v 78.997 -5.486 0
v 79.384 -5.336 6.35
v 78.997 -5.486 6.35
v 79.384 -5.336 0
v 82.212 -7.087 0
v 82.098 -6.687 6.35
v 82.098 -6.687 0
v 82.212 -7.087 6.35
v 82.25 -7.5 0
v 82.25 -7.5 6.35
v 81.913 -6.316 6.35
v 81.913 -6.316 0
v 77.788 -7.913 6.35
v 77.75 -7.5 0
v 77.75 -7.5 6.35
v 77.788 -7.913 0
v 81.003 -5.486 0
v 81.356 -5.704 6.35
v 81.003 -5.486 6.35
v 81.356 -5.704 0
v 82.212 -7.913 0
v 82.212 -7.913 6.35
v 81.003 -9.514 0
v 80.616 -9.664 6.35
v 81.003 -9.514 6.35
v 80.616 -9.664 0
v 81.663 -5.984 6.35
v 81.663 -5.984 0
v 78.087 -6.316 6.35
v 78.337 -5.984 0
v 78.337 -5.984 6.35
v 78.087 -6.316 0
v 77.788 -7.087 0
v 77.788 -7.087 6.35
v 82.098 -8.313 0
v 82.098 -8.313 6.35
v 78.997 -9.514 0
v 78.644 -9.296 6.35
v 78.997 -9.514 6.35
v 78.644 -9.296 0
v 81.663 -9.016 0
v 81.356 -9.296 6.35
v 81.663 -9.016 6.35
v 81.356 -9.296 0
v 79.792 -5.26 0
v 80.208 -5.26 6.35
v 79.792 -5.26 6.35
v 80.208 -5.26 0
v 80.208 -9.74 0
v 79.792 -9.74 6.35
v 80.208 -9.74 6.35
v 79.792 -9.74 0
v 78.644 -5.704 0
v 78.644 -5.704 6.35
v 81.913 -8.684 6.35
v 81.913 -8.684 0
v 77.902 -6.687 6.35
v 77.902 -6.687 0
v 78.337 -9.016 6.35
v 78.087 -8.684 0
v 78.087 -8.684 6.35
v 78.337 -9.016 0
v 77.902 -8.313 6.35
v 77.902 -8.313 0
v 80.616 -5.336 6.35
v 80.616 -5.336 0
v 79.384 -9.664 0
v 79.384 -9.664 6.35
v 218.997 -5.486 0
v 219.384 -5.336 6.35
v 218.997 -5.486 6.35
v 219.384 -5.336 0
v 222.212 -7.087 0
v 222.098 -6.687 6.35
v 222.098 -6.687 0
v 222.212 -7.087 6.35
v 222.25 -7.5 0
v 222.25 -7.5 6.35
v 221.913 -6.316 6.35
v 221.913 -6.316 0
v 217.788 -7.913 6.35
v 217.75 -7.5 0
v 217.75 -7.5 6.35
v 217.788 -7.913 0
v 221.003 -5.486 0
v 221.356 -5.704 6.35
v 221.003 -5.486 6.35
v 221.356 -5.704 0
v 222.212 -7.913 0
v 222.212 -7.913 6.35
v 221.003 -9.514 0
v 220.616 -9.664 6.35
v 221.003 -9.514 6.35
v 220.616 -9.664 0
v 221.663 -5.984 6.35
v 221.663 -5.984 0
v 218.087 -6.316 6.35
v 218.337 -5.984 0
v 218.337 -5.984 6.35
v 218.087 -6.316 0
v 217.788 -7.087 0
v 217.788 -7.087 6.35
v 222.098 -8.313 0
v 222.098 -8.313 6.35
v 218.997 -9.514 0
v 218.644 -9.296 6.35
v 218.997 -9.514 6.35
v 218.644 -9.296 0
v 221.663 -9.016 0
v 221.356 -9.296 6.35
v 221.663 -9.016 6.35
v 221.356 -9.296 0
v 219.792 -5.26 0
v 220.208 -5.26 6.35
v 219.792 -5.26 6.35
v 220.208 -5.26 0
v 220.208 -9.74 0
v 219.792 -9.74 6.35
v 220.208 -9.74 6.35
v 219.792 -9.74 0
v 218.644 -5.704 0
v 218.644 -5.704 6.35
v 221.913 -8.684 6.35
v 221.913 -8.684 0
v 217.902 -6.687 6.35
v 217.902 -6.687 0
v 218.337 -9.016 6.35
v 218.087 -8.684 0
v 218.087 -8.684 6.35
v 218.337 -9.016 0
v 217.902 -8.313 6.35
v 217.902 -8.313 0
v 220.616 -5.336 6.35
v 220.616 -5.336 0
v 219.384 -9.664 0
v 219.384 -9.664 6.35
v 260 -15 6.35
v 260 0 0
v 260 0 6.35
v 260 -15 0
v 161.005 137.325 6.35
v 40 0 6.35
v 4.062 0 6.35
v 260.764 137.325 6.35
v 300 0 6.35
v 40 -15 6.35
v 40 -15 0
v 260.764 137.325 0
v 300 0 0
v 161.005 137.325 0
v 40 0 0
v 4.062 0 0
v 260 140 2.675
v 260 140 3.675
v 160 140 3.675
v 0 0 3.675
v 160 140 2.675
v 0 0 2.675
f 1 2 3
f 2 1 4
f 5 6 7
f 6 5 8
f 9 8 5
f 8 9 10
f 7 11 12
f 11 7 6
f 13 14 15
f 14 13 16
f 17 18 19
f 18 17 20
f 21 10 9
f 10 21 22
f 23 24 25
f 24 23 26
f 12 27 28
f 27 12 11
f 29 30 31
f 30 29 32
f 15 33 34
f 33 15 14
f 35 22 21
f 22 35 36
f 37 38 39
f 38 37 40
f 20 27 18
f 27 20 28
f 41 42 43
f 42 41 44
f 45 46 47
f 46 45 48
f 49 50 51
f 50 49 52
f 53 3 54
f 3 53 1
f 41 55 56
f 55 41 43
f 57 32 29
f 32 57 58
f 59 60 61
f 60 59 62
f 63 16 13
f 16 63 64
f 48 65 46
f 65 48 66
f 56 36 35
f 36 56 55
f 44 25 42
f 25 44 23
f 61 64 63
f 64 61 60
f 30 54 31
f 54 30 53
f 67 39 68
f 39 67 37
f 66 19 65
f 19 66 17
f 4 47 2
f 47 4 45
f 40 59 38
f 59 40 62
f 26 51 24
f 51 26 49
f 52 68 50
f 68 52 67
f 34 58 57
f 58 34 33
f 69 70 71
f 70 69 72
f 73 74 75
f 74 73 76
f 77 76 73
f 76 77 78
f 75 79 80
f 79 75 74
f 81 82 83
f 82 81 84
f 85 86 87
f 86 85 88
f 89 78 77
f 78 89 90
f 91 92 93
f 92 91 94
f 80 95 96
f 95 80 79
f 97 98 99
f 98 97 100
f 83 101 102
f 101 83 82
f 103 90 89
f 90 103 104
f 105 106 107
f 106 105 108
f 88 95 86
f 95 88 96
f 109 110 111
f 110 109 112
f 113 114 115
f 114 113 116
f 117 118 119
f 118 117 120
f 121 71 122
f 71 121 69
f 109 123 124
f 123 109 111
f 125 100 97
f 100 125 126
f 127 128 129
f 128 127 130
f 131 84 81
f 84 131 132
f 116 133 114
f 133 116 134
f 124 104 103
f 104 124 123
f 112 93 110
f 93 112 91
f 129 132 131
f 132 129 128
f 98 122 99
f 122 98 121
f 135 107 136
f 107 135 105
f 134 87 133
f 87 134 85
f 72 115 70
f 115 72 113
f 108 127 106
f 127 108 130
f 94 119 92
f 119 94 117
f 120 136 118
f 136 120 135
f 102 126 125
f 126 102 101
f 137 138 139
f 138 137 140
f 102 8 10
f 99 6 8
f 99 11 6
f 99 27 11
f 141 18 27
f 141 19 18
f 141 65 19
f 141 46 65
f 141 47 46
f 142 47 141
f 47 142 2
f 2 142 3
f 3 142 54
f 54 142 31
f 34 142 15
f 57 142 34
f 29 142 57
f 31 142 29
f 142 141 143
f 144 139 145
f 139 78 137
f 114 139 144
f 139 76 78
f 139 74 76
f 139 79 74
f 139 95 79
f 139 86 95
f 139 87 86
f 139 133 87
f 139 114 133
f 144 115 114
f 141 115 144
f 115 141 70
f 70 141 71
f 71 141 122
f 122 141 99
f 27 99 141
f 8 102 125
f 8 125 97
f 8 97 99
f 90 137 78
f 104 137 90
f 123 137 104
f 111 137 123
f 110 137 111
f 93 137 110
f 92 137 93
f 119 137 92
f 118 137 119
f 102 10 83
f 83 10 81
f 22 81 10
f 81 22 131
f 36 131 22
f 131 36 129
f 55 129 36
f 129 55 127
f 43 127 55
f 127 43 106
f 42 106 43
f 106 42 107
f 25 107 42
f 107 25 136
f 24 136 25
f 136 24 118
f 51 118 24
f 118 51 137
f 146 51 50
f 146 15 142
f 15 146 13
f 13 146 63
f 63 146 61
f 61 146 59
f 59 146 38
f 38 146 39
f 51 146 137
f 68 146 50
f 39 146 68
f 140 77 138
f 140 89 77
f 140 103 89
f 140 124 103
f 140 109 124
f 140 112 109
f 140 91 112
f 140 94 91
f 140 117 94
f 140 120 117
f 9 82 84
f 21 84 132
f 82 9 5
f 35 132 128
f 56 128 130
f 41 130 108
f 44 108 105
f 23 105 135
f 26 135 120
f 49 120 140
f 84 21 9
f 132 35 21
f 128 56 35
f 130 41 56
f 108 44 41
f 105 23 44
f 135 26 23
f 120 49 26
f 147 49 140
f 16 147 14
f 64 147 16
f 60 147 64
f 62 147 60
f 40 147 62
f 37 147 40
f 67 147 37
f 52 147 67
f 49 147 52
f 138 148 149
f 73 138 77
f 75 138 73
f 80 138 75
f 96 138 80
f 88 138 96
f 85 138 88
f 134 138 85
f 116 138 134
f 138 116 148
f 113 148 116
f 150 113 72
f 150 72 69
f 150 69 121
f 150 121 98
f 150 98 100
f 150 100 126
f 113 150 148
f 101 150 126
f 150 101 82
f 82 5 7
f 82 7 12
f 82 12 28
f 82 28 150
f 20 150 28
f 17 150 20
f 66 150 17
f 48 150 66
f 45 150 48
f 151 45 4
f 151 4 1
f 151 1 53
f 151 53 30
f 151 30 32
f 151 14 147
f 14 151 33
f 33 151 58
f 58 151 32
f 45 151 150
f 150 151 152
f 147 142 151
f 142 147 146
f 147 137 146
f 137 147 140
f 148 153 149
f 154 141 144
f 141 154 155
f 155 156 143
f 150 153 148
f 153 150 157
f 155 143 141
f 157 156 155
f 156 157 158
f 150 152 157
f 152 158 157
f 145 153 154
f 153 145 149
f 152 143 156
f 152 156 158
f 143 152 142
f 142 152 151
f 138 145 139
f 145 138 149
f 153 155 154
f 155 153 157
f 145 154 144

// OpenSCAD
// PART: Clipped-delta fin with through-the-wall tab, 300 root / 100 tip / 140 span, 1/4 in 6061-T6 plate
// KIND: mechanical
// MAKE: CNC mill from 6.35 mm 6061-T6 plate (waterjet the outline first if available); mill the 45 deg LE and tip bevels both faces on a vacuum plate, 2 setups (flip on the two tab holes); ream/drill tab holes 4.50 in setup 1; calipers on chords/span/tab, 45 deg angle gauge and 1.0 feeler on the bevel flat, pins in the holes
// NOTE: Fin laid flat, thickness along Z, root edge on Y=0, leading edge from the origin; tab hangs in -Y so main() spans Y -15..140
// NOTE: Root chord 300.00 mm = 11.811 in; tip chord 100.00 = 3.937 in; semi-span 140.00 = 5.512 in; LE sweep 160.00 = 6.299 in; thickness 6.35 = 1/4 in plate
// NOTE: Airframe 6.000 in OD = 152.40 mm with 2.0 mm wall (ID 148.4) and a 98 mm motor mount tube OD 101.60 = 4.000 in are ASSUMED; tab_h 15 is the brief's value and only reaches part-way to the MMT: for the tab to bottom on the MMT set tab_h = wall + (ID - MMT_OD)/2 = 2.0 + 23.4 = 25.4
// NOTE: Bevels: leading edge and tip chamfered 45 deg on BOTH faces leaving a 1.00 mm flat (1.88 mm per face); trailing edge and root stay square. A knife edge on G10 chips, keep the flat
// NOTE: Tab holes: 2 x 4.50 mm (M4 clearance, ISO 273 medium; 4.5 mm is a standard drill) at X 80 / 220, Y -7.5: injected fillet epoxy keys through them and they take 4 mm dowels in a fin-can alignment jig. Optional: set tab_hole_pitch or delete the loop
// NOTE: FLUTTER as drawn FAILS the declared 700 m/s at 3000 m: NACA TN 4197 (Martin) with G = 4.1 GPa gives Vf about 290 m/s (centroid epsilon) to 334 m/s (Martin epsilon 0.25), SF 0.41-0.48 vs sf_min 1.5. This 4.76 plate is a Mach 0.6 fin. For 700 m/s at SF 1.5 use fin_t = 12.70 (1/2 in G10, Vf about 1260 m/s, SF 1.8) or a tip-to-tip carbon layup (outside the formula)
// NOTE: G10-FR4 shear modulus 4.1 GPa is Bennett's (2025) working value (600 ksi); direct measurements report about 5.3 GPa (775 ksi). E about 18 GPa lengthwise, density 1.85 g/cm3. 6061-T6 plate (G 26 GPa) is the machined alternative: Vf about 730 m/s at 4.76 (SF 1.04), about 1120 m/s at 6.35 (SF 1.6)
// NOTE: Waterjet holds +/-0.1 on 4.76 mm G10 at quality 4-5, so the +/-0.20 on chords, span and tab is the process capability, not ISO 2768-m general (+/-0.5 over 120-400)
// SPEC-BEGIN
// {"name":"Clipped-delta G10 fin with TTW tab","size_mm":[300,155,6.35],
//  "parts":[{"name":"fin","role":"clipped-delta plate, LE and tip bevelled 45 deg both faces","size_mm":[300,140,6.35]},
//           {"name":"tab","role":"through-the-wall root tab with 2 epoxy-key holes, overlaps the fin root by 2","size_mm":[220,17,6.35]}],
//  "joints":[{"a":"tab","b":"fin","overlap_mm":2}],
//  "layout":[{"a":"tab","rel":"front","b":"fin"}],
//  "profile":[{"part":"fin","along":"y","measure":"x","from_mm":300,"to_mm":100,"why":"clipped delta: chord tapers from the root to the tip"}]}
// SPEC-END
// FLIGHT-BEGIN
// {"material":"6061-T6","process":"cnc_mill","tolerance_class":"ISO 2768-m","tess_tol_mm":0.01,
//  "critical":[{"name":"root chord","module":"fin","axis":"x","nominal_mm":300.00,"tol_mm":0.20},
//              {"name":"semi-span","module":"fin","axis":"y","nominal_mm":140.00,"tol_mm":0.20},
//              {"name":"plate thickness","module":"fin","axis":"z","nominal_mm":6.35,"tol_mm":0.05,"round":false},
//              {"name":"tip chord at the tip flat","module":"tip_chord_gauge","axis":"x","nominal_mm":100.00,"tol_mm":0.20},
//              {"name":"tab length","module":"tab","axis":"x","nominal_mm":220.00,"tol_mm":0.20},
//              {"name":"tab height below the root","module":"tab_gauge","axis":"y","nominal_mm":15.00,"tol_mm":0.20},
//              {"name":"overall height, tab to tip","module":"main","axis":"y","nominal_mm":155.00,"tol_mm":0.30}],
//  "bores":[],
//  "holes":[{"name":"tab epoxy-key holes","d_mm":4.50,"tol_mm":0.10,"pattern":"list","at_mm":[[80,-7.5],[220,-7.5]],"axis":"z","from_mm":0,"to_mm":6.35}],
//  "gauges":[{"name":"LE bevel GO","module":"gauge_le_bevel","expect":"clear","why":"45 deg bevel fully cut on both faces along the whole leading edge"},
//            {"name":"LE flat present","module":"gauge_le_flat","expect":"interfere","why":"the 1.0 mm leading-edge flat exists, not a knife edge"}],
//  "loads":[{"check":"flutter","name":"fin at max Q","root_mm":300,"tip_mm":100,"span_mm":140,"thick_mm":6.35,"v_max_m_s":700,"alt_m":3000,"sf_min":1.5}],
//  "mfg":{"stock":"6.35 mm (1/4 in) 6061-T6 plate, 320 x 175 mm blank per fin",
//         "finish":"as cut; scuff the whole tab and a 12 mm band each side of the root with 80 grit before epoxy",
//         "heat_treat":"none",
//         "deburr":"break all waterjet edges 0.3-0.5 mm with 220 grit (no machined chamfer on root, TE or tab edges); the bevels keep their 1.0 mm flat, do not sand to a knife edge",
//         "inspect":["root chord, tip chord, span and tab length with calipers","thickness with a micrometer at 4 places (sheet as supplied)","bevel angle with a 45 deg angle gauge; flat width 1.0 with a feeler against a straightedge","tab holes with 4.38 GO / 4.60 NO-GO pins"],
//         "notes":["Waterjet: 0.8 mm garnet kerf, quality 4-5 edge, taper under 0.05 on 4.76 mm; pierce outside the profile; cut with the LE 1.88 mm oversize only if the bevel is to be milled to a witness line",
//                  "Bevels: 45 deg chamfer mill or tilted head, both faces, on a vacuum plate or toe clamps in the tab holes; the bevel runs out at the root corner and mitres into the tip bevel",
//                  "Bond: tab through the airframe slot to the motor mount, 4 internal fillets, epoxy injected through the tab holes forms keys; external fillets 10 mm radius",
//                  "Flutter SF at 700 m/s is under 1 as drawn (see NOTE): change fin_t or v_max before a Mach 2 flight; the app recomputes the loads row from fin_t",
//                  "6061-T6 alternative: same file, material 6061-T6, process cnc_mill, chamfer all edges 0.5 x 45 with a chamfer mill and add 0.5 x 45 to the deburr line"]}}
// FLIGHT-END
tess_tol = 0.01; // max chordal deviation of curved surfaces (mm)
root_c = 300.00; // root chord, along X on Y=0 (11.811 in)
tip_c = 100.00; // tip chord, along X at Y=span (3.937 in)
span = 140.00; // semi-span, root edge to tip edge along Y (5.512 in)
le_sweep = 160.00; // leading-edge sweep: X offset of the tip LE corner from the root LE corner (6.299 in)
fin_t = 6.35; // plate thickness, 1/4 in 6061-T6 plate, critical (flutter SF 1.6 at 700 m/s; G10 at 4.76 fails, see NOTE)
le_flat = 1.00; // flat left on the leading edge and tip after bevelling (G10 knife edges chip)
bevel_ang = 45; // bevel angle from the plate face, degrees (OpenSCAD trig is in degrees)
tab_len = 220.00; // TTW tab length along X, centred on the root chord (8.661 in)
tab_h = 15.00; // tab height below the root, through the airframe wall toward the MMT (see NOTE: 25.4 bottoms on a 98 mm MMT in a 6 in tube)
tab_overlap = 2.00; // tab extends this far into the fin body so the SPEC joint has real shared volume
tab_hole_d = 4.50; // tab epoxy-key / jig-pin holes, M4 clearance ISO 273 medium, 4.5 mm standard drill
tab_hole_pitch = 140.00; // spacing of the two tab holes, symmetric about the tab centre (X 80 and 220)
cut_ext = 1; // hole cutters overshoot each face by this much so the boolean is clean
gauge_gap = 0.10; // clearance between the bevel GO gauge and the nominal bevel plane
gauge_slab = 0.01; // thickness of the slab that samples the tip chord at the tip flat
// --- end parameters ---
function fn_tol(d, tol=tess_tol) = max(24, ceil(180 / acos(1 - min(0.5, 2*tol/d))));
// Derived geometry. atan2/sin/tan take and return DEGREES in OpenSCAD, so no radian conversion anywhere.
le_ang = atan2(span, le_sweep); // leading-edge angle from the root chord, degrees (41.19 for 140/160)
le_len = sqrt(le_sweep*le_sweep + span*span); // leading-edge length (212.60)
bevel_in = (fin_t - le_flat)/2 / tan(bevel_ang); // in-plane inset of each bevel at the plate face (1.88 at 45 deg)
z_flat_lo = (fin_t - le_flat)/2; // bottom of the LE/tip flat (1.88)
z_flat_hi = z_flat_lo + le_flat; // top of the LE/tip flat (2.88)
// Planform with the LE and tip edges moved inward by d; root and TE stay put. d=0 is the outer outline.
// A line shifted d perpendicular to itself moves d/sin(le_ang) along the root, which is what the LE corner needs.
function planform(d) = [
  [d / sin(le_ang), 0],
  [root_c, 0],
  [root_c + (le_sweep + tip_c - root_c) * (span - d) / span, span - d],
  [(span - d) * le_sweep / span + d / sin(le_ang), span - d]
];
module fin(){ // one convex hull: the 1.0 flat at mid-thickness plus the full-thickness inset core = 45 deg bevels on LE and tip, square root and TE
  hull(){
    translate([0, 0, z_flat_lo]) linear_extrude(le_flat) polygon(planform(0));
    linear_extrude(fin_t) polygon(planform(bevel_in));
  }
}
module tab(){ // root tab in -Y, overlapping the fin root by tab_overlap; the two holes are the only boolean in the file
  difference(){
    translate([root_c/2 - tab_len/2, -tab_h, 0]) cube([tab_len, tab_h + tab_overlap, fin_t]);
    for(x = [root_c/2 - tab_hole_pitch/2, root_c/2 + tab_hole_pitch/2])
      translate([x, -tab_h/2, -cut_ext]) cylinder(d=tab_hole_d, h=fin_t + 2*cut_ext, $fn=fn_tol(tab_hole_d));
  }
}
module main(){ union(){ fin(); tab(); } }
// --- inspection modules (referenced by FLIGHT critical/gauges; not SPEC parts) ---
module tip_chord_gauge(){ // sliver of the fin at the tip flat: its X extent is the tip chord
  intersection(){ fin(); translate([-1, span - gauge_slab, -1]) cube([root_c + 2, gauge_slab + 1, fin_t + 2]); }
}
module tab_gauge(){ // everything below the root line: its Y extent is the tab height
  intersection(){ main(); translate([-1, -tab_h - 1, -1]) cube([root_c + 2, tab_h + 1, fin_t + 2]); }
}
module gauge_le_bevel(){ // two 45 deg wedges riding gauge_gap above the upper and below the lower LE bevel, full LE length: expect clear
  intersection(){
    main();
    rotate([0, 0, le_ang]) rotate([90, 0, 90]) linear_extrude(le_len) union(){
      polygon([[0, z_flat_hi + gauge_gap], [-(bevel_in - gauge_gap), fin_t], [0, fin_t]]);
      polygon([[0, z_flat_lo - gauge_gap], [-(bevel_in - gauge_gap), 0], [0, 0]]);
    }
  }
}
module gauge_le_flat(){ // thin block on the LE at the bottom 0.1-0.2 of the flat, middle 80% of the LE: expect contact (empty if ground to a knife edge)
  intersection(){
    main();
    rotate([0, 0, le_ang]) translate([0.1*le_len, -0.05, z_flat_lo + 0.1]) cube([0.8*le_len, 0.05, 0.1]);
  }
}
main();
